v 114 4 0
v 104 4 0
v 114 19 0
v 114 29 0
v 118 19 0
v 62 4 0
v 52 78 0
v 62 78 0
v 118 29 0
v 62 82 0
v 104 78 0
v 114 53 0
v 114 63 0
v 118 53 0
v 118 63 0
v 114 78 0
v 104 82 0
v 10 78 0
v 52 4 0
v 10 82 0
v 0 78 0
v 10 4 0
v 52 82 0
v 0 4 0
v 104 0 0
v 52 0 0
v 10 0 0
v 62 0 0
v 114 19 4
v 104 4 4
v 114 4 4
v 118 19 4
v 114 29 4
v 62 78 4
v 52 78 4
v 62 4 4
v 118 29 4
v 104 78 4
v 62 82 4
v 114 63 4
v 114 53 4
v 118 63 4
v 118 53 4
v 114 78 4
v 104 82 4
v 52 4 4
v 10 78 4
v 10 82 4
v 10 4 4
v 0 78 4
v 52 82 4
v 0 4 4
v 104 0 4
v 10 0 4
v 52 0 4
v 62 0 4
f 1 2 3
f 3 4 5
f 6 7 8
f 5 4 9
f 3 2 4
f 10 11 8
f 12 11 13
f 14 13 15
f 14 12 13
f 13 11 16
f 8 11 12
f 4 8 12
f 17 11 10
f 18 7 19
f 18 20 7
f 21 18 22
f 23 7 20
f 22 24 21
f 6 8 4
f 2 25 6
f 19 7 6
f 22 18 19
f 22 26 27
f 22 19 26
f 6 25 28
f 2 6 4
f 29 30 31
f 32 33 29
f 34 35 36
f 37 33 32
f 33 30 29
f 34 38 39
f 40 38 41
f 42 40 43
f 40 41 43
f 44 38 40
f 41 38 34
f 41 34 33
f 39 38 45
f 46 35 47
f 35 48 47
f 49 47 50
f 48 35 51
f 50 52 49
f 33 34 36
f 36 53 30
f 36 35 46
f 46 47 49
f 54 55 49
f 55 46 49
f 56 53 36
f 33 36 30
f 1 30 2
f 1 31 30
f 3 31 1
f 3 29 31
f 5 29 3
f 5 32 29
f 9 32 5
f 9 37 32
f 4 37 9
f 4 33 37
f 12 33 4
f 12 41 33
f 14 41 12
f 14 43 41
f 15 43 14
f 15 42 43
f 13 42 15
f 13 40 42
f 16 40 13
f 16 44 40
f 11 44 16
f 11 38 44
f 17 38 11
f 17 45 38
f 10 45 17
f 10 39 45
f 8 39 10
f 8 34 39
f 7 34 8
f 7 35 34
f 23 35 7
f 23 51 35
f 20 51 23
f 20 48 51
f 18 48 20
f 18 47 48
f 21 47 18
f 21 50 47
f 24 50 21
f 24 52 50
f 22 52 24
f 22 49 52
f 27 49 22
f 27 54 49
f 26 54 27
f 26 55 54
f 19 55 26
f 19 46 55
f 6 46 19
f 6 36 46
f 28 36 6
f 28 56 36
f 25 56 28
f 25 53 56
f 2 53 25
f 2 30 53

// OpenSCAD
// file: 1A.1.scad
/* Copyright 2018 Guillaume JORANDON
 * 
 * This file is distributed under the terms of the MIT License.
 * Check https://opensource.org/licenses/MIT for more details.
 * 
 * ./front_core/1A.1.scad: back plate attached to the front of the rear core.
 *
 * quantity: 1
 * NB.: units are assumed to be millimeters.
 */

include <../globals.scad>
include <globals.scad>

module front_core_lip() {
    translate([-front_core_width/2, 0, 0]) {
        square([front_core_lip_reduction/2 + front_core_lip_inner_slope, front_core_partial_height-(front_core_width/2)]);
        translate([0, front_core_partial_height-(front_core_width/2), 0]) {
            polygon([[0, 0], [front_core_lip_reduction/2, 0], [front_core_lip_reduction/2, front_core_lip_height]]);
            polygon([[front_core_lip_reduction/2, 0], [front_core_lip_reduction/2 + front_core_lip_inner_slope, 0], [front_core_lip_reduction/2, front_core_lip_height]]);
        }
    }
}

module front_core_lips() {
    front_core_lip();
    mirror([1, 0, 0]) front_core_lip();
}

module front_core_1A_1_base() {
    translate([front_core_width/2, front_core_width/2, 0]) {
        difference() {
            circle(front_core_width/2);
            union() {
                translate([-(front_core_width-front_core_lip_reduction)/2+front_core_lip_inner_slope, -front_core_width/2 + front_core_inner_floor_height, 0]) square([front_core_width-front_core_lip_reduction-2*front_core_lip_inner_slope, front_core_width/2 - front_core_inner_floor_height]);
                translate([-front_core_width/2, 0, 0]) square([front_core_width, front_core_width/2]);
            }
        }
        front_core_lips();
    }
}

module front_core_tube_cut() {
    translate([front_core_width/2, front_core_width/2, 0]) {
        difference() {
            circle(front_core_width/2);
            union() {
                translate([-front_core_width/2, 0, 0]) square([front_core_width, front_core_width/2]);
                circle((front_core_width/2)-front_core_lower_tube_thickness);
            }
        }
    }
}

module front_core_floor_attaching_hole() {
    translate([front_core_floor_hole_distance/2, 0, 0]) square([front_core_floor_hole, sheet_thickness]);
}

module front_core_floor_attaching_holes() {
    union() {
        translate([front_core_width/2, front_core_inner_floor_height-sheet_thickness, 0]) {
            mirror([1, 0, 0]) front_core_floor_attaching_hole();
            front_core_floor_attaching_hole();
        }
    }
}

module front_core_inner_walls_attaching_hole() {
    translate([front_core_width/2 - front_core_lip_reduction/2 - front_core_lip_inner_slope, 0, 0]) square([sheet_thickness, front_core_inner_walls_hole]);
}

module front_core_inner_walls_attaching_holes() {
    union() {
        translate([front_core_width/2, front_core_inner_floor_height + (front_core_partial_height-front_core_inner_floor_height- front_core_inner_walls_hole)/2, 0]) {
            mirror([1, 0, 0]) front_core_inner_walls_attaching_hole();
            front_core_inner_walls_attaching_hole();
        }
    }
}

module front_core_junction_hole() {
    translate([11, 8, 0]) circle(front_core_junction_hole_diameter/2);
}

module front_core_junction_holes() {
    translate([front_core_width/2, 20, 0]) {
        front_core_junction_hole();
        rotate([0, 0, 180]) front_core_junction_hole();
        rotate([180, 0, 0]) front_core_junction_hole();
        rotate([0, 180, 0]) front_core_junction_hole();
    }
}

module front_core_1A_1() {
    difference() { 
        front_core_1A_1_base();
        union() {
            front_core_tube_cut();
            front_core_floor_attaching_holes();
            front_core_inner_walls_attaching_holes();
            front_core_junction_holes();
        }
    }
}

linear_extrude(sheet_thickness) front_core_1A_1();
// file: 1A.3.scad
/* Copyright 2018 Guillaume JORANDON
 * 
 * This file is distributed under the terms of the MIT License.
 * Check https://opensource.org/licenses/MIT for more details.
 * 
 * ./front_core/1A.3.scad: inner side walls.
 *
 * quantity: 2
 * NB.: units are assumed to be millimeters.
 */

include <../globals.scad>
include <globals.scad>

module front_core_inner_floor_side_holes() {
    square([ front_core_inner_walls_hole, sheet_thickness]);
        translate([(front_core_partial_length-sheet_thickness-front_core_inner_walls_hole)/2, 0, 0]) square([ front_core_inner_walls_hole, sheet_thickness]);
        translate([front_core_partial_length-sheet_thickness-front_core_inner_walls_hole, 0, 0]) square([ front_core_inner_walls_hole, sheet_thickness]);
}

module front_core_1A_3() {
    translate([0, sheet_thickness, 0]) {
        square([front_core_partial_length-sheet_thickness, front_core_partial_height-front_core_inner_floor_height]);
        translate([front_core_partial_length-sheet_thickness, (front_core_partial_height-front_core_inner_floor_height - front_core_inner_walls_hole)/2, 0]) square([sheet_thickness, front_core_inner_walls_hole]);
        translate([0, -sheet_thickness, 0]) front_core_inner_floor_side_holes();
    }
}

linear_extrude(sheet_thickness) front_core_1A_3();
// file: globals.scad
/* Copyright 2018 Guillaume JORANDON
 * 
 * This file is distributed under the terms of the MIT License.
 * Check https://opensource.org/licenses/MIT for more details.
 * 
 * ./front_core/globals.scad: global variables that apply to pieces from the front core.
 *
 * NB.: units are assumed to be millimeters.
 */

include <../globals.scad>

/* Total height of the front core */
front_core_height = 128;
/* Total length of the front core */
front_core_length = 161;
/* Total width of the front core */
front_core_width = 100;
/* height from bottom to the first lip */
front_core_partial_height = 61;
/* height from bottom of the piece to the top of the inner floor */
front_core_inner_floor_height = 40;
/* relative height between the bottom and the top of the lip */
front_core_lip_height = 4;
/* how much the lip reduces the inner core container */
front_core_lip_reduction = 16;
/* distance from the tubular core (including the back border) to the bottom of the piece */
front_core_tube_elevation = 42;
/* outer diameter of the transparent tubular core */
front_core_tube_diameter = 55;
/* size of the back border of the transparent core */
front_core_tube_back_border_size = 5;
/* lip inner slope width */
front_core_lip_inner_slope = 5;
/* thickness of the PVC tube for the lower part of the front core */
front_core_lower_tube_thickness = 3;
/* thickness of the transparent center core */
front_core_center_core_thickness = 3;
/* length of the center core tube, including the extra space in the rear core, and the extra space on the front */
front_core_center_core_length = 117 + 2*sheet_thickness;
/* distance from the front of the piece */
front_core_center_core_offset = 44;
/* length of holes to attach the floor of the piece */
front_core_floor_hole = 10;
/* distance between the two attaching holes of the floor */
front_core_floor_hole_distance = 24;
/* length of holes to attach the inner walls of the piece */
front_core_inner_walls_hole = front_core_floor_hole;
/* hole of the junction screws */
front_core_junction_hole_diameter = 5;
/* hole of the junction nuts */
front_core_junction_nut_diameter = front_core_junction_hole_diameter*2;
/* length of the front core if we remove the junction with 1B */
front_core_partial_length = 110 + 2*sheet_thickness;
// file: ../globals.scad
/* Copyright 2018 Guillaume JORANDON
 * 
 * This file is distributed under the terms of the MIT License.
 * Check https://opensource.org/licenses/MIT for more details.
 * 
 * ./globals.scad: some global variables that apply to every piece.
 *
 * NB.: units are assumed to be millimeters.
 */

/*Thickness of laser cutted sheets */
sheet_thickness = 4;
/* Margin on the printsheet */
print_margin = 3;
/* Curves accuracy */
$fn = 360;

/* Distance between the border of the bottom of the frontest plate of the rear_core and the bottom of the front core */
cores_offset = 16;
// main file
/* Copyright 2018 Guillaume JORANDON
 * 
 * This file is distributed under the terms of the MIT License.
 * Check https://opensource.org/licenses/MIT for more details.
 * 
 * ./front_core/1A.4.scad: inner floor.
 *
 * quantity: 1
 * NB.: units are assumed to be millimeters.
 */

include <../globals.scad>
include <globals.scad>
use <1A.3.scad>
use <1A.1.scad>

module front_core_1A_4() {
    difference() {
        union() {
            square([front_core_partial_length-sheet_thickness, front_core_width-front_core_lip_reduction-2*front_core_lip_inner_slope+2*sheet_thickness]);
            translate([front_core_partial_length-sheet_thickness, ((front_core_width-front_core_lip_reduction-2*front_core_lip_inner_slope+2*sheet_thickness) - (front_core_floor_hole_distance+2*front_core_floor_hole))/2, 0]) rotate([0, 0, 90]) translate([(-(front_core_width+sheet_thickness)/2 + front_core_floor_hole_distance), -front_core_inner_floor_height, 0]) {
                front_core_floor_attaching_holes();
            }
            
        }
        union() {
            front_core_inner_floor_side_holes();
            translate([0, front_core_width-front_core_lip_reduction-2*front_core_lip_inner_slope+sheet_thickness, 0]) front_core_inner_floor_side_holes();
        }
    }
}

linear_extrude(sheet_thickness) front_core_1A_4();
